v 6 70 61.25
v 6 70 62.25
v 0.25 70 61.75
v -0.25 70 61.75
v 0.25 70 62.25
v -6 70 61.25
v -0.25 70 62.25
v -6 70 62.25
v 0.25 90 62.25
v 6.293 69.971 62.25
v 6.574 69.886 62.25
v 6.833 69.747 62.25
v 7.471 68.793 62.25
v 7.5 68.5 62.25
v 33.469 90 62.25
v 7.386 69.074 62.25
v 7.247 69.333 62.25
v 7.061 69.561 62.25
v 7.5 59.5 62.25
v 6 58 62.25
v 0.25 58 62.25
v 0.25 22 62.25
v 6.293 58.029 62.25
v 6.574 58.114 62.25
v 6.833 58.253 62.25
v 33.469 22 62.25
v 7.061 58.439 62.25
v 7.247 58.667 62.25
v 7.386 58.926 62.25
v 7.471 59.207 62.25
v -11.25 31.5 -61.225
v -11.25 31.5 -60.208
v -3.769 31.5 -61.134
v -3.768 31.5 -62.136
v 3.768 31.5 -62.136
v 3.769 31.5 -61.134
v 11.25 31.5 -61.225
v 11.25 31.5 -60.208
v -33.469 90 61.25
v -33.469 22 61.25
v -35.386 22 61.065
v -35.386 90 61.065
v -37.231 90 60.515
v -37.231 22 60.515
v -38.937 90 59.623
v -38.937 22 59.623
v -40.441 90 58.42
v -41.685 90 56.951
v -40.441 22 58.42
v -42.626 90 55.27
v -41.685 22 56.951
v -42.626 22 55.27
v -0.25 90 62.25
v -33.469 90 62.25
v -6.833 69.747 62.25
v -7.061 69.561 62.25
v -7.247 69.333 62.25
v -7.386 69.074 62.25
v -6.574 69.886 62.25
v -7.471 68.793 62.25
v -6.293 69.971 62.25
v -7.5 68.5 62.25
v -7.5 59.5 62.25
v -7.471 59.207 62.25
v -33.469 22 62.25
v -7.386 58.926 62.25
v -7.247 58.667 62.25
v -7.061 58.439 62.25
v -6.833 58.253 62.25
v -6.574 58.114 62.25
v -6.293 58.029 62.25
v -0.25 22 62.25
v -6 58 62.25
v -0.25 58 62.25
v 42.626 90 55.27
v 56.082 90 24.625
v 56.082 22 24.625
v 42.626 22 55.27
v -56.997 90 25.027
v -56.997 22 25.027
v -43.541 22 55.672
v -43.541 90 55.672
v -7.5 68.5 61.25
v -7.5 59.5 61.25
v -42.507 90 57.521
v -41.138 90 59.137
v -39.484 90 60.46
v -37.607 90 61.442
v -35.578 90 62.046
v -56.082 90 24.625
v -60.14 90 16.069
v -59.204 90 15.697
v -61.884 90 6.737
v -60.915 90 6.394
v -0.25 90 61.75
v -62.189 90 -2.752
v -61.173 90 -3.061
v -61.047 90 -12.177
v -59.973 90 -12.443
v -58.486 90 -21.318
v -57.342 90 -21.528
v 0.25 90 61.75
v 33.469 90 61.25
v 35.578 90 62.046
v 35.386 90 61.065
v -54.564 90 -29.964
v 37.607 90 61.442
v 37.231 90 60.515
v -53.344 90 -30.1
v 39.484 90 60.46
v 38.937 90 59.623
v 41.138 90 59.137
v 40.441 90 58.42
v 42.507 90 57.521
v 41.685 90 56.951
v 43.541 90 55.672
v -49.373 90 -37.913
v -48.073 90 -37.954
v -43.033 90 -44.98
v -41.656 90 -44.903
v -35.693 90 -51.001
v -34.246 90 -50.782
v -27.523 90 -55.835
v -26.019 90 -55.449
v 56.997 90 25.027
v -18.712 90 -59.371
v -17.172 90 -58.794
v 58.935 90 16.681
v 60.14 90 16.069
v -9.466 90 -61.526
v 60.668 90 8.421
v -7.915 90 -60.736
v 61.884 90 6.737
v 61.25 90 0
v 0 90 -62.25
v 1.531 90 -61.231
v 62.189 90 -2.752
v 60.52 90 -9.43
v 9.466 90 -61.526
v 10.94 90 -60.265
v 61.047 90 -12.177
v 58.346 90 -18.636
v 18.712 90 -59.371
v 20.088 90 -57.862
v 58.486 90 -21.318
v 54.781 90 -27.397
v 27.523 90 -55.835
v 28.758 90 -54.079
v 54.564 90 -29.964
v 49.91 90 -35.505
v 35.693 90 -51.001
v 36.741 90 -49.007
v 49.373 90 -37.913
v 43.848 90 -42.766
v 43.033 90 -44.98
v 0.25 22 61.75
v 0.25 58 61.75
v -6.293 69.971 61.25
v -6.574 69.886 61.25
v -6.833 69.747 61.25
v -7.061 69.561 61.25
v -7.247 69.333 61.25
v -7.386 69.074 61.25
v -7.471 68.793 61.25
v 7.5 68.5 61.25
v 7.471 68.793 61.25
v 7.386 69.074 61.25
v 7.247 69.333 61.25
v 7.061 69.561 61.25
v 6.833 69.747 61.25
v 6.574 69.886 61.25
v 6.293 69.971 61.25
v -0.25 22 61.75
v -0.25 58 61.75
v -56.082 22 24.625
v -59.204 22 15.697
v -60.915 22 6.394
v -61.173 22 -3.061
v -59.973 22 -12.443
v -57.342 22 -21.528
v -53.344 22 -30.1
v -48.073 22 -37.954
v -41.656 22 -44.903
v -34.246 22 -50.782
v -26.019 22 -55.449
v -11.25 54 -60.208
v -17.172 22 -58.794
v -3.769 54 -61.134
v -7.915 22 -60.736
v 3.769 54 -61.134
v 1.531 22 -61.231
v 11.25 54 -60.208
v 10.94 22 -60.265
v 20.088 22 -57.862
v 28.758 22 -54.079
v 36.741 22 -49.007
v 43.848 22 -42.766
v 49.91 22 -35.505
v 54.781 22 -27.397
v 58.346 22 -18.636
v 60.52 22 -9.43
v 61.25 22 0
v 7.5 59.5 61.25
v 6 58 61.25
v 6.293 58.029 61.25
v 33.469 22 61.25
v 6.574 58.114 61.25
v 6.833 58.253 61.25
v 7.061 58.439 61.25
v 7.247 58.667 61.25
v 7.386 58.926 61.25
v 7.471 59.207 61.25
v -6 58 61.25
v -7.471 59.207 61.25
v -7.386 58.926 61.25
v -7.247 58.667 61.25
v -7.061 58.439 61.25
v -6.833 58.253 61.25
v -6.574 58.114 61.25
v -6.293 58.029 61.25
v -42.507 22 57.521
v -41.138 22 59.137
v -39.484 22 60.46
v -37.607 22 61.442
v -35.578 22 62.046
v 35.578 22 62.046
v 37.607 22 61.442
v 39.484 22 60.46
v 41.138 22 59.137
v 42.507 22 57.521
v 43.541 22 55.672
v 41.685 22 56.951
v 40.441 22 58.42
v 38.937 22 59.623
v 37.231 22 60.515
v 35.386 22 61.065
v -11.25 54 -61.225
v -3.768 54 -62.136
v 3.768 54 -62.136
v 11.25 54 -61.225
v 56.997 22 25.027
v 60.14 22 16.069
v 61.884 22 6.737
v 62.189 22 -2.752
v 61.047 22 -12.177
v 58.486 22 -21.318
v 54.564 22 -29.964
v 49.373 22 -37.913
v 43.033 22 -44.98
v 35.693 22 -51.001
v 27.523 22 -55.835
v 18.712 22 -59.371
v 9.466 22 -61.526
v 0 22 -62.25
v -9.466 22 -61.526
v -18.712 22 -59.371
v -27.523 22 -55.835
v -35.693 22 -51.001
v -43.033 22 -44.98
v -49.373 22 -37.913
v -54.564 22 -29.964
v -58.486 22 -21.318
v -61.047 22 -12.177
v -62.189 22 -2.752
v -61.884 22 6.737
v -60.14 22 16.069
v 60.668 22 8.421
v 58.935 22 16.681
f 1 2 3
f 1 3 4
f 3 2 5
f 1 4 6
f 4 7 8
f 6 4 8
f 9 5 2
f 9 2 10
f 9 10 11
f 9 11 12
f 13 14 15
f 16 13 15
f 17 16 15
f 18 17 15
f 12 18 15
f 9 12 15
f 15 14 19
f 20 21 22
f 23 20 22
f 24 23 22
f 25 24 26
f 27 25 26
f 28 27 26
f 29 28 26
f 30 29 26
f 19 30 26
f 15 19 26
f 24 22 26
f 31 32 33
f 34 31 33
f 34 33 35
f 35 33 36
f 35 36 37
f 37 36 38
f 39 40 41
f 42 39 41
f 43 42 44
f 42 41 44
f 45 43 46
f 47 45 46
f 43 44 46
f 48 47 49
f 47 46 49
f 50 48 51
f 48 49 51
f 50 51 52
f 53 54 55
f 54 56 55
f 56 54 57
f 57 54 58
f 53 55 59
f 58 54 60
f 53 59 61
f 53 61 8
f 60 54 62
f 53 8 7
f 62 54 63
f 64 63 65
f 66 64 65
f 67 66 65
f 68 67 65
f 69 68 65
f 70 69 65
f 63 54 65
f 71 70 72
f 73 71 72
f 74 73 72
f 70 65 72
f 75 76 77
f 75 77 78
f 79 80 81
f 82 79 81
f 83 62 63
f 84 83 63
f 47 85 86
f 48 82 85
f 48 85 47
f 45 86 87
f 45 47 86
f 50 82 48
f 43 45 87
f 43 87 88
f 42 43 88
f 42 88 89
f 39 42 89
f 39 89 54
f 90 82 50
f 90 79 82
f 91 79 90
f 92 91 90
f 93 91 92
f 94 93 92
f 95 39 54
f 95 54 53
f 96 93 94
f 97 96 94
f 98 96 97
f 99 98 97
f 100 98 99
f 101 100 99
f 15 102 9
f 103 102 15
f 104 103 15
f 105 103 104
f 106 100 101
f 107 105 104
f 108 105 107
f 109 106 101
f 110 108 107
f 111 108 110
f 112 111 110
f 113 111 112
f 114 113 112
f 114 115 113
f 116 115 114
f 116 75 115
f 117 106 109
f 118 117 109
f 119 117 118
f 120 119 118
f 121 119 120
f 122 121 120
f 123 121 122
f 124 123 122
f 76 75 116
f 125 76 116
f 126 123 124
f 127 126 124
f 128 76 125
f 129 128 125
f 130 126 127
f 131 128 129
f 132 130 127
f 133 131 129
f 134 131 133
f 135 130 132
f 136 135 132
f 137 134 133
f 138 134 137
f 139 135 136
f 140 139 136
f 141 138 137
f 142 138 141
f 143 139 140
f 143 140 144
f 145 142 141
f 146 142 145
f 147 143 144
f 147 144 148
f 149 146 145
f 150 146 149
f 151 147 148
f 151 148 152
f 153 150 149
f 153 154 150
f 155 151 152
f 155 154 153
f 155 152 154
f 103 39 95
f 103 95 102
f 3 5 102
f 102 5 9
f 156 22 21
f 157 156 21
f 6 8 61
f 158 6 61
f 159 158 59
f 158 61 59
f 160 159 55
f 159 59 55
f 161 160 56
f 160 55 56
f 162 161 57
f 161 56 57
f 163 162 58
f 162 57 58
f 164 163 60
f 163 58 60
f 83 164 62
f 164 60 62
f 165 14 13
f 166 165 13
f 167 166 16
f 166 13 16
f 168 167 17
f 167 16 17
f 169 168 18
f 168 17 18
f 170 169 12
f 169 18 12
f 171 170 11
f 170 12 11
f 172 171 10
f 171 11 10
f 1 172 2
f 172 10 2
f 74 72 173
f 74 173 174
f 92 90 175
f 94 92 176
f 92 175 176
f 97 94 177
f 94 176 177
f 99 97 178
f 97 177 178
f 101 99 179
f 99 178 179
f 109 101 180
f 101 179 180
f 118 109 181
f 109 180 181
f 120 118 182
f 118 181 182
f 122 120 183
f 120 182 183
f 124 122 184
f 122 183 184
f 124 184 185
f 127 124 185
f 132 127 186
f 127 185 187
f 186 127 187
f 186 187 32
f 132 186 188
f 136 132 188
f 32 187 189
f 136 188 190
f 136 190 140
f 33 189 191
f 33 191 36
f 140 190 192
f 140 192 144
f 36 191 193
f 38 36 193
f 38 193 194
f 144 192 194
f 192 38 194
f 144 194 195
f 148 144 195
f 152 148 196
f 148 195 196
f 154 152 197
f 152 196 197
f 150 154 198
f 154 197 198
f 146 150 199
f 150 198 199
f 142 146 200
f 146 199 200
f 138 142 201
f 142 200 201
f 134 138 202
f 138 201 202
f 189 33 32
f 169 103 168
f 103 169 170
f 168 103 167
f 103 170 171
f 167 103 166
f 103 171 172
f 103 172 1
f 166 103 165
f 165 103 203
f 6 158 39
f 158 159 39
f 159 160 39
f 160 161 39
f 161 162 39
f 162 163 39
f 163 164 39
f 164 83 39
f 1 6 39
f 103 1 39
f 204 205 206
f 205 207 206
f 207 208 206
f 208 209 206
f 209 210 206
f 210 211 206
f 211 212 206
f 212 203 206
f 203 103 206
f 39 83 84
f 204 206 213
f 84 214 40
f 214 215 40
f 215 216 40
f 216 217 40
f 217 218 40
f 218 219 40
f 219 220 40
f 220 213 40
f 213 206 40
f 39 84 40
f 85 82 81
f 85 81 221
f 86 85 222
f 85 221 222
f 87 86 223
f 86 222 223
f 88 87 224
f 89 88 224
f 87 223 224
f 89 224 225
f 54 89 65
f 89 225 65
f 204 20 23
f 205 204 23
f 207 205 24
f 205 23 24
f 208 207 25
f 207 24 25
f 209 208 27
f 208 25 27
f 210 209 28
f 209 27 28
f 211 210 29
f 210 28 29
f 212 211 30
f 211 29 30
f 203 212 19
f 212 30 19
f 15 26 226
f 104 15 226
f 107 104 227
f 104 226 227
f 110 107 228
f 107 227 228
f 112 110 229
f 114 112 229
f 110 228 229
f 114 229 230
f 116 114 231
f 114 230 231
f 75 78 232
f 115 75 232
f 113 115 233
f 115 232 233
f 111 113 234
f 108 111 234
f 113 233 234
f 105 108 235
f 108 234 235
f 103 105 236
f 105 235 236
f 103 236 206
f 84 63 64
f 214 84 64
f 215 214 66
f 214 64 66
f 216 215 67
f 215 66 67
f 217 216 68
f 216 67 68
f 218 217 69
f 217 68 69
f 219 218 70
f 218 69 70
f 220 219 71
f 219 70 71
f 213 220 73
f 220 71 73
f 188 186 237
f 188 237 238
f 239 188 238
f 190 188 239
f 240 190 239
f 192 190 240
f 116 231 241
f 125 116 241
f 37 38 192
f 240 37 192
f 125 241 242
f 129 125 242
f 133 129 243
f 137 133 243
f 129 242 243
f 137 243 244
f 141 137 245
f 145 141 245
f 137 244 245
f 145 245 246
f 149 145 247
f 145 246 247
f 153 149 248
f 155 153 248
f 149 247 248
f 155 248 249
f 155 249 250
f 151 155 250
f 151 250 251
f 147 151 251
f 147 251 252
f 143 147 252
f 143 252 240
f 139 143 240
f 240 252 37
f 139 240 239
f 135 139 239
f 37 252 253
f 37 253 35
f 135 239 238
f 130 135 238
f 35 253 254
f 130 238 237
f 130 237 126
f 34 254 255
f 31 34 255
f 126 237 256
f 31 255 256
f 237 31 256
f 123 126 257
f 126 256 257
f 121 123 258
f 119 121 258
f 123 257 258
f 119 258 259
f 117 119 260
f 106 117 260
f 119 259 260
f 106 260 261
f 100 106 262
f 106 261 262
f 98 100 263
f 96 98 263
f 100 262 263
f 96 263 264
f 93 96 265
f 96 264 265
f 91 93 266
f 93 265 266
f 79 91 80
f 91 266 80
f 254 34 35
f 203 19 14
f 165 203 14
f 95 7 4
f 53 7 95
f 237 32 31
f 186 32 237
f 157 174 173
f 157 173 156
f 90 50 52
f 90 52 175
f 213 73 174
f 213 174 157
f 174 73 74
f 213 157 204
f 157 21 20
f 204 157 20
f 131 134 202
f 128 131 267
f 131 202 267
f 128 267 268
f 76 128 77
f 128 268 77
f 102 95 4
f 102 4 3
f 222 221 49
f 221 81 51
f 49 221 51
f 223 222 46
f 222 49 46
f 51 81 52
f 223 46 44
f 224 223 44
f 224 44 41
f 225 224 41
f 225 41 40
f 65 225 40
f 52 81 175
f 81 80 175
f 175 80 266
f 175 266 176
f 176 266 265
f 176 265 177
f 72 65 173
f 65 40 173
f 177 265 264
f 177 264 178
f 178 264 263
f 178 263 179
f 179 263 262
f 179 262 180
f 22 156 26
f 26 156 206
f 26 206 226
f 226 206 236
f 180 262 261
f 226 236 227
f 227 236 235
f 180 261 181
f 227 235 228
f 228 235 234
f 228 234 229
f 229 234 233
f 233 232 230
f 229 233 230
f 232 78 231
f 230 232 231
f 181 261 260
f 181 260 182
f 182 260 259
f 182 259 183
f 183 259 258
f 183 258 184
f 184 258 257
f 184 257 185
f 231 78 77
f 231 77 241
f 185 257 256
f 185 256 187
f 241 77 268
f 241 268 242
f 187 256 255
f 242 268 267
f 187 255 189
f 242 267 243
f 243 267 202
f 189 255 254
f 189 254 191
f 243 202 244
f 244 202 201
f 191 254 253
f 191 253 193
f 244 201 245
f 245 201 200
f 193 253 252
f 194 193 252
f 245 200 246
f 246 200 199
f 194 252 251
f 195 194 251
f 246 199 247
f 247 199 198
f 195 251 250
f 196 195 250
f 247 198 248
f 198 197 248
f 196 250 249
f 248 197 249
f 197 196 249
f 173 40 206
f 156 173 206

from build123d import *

# Parameters (mm, degrees)
BOSS_EXTRUDE1_DEPTH = 90
CUT_EXTRUDE1_DEPTH  = 22
SKETCH4_W           = 22.5
SKETCH4_H           = 22.5
CUT_EXTRUDE3_DEPTH  = 126.897279558
CUT_EXTRUDE4_DEPTH  = 3
SKETCH6_W           = 0.5
SKETCH6_H           = 68
CUT_EXTRUDE5_DEPTH  = 0.5


# Read off the part's stored shape, not the designer's step: Cut-Extrude1
with BuildPart() as part:
    # Sketch1 → Boss-Extrude1 (new body)
    with BuildSketch(Plane(origin=(0, 0, 0), x_dir=(1, 0, 0), z_dir=(0, 1, 0))):
        with BuildLine():
            ThreePointArc((33.469387755, -62.25), (39.484065665, -60.45997555), (43.541212573, -55.672481752))
            Line((43.541212573, -55.672481752), (56.997372263, -25.027226277))
            ThreePointArc((56.997372263, -25.027226277), (0, 62.25), (-56.997372263, -25.027226277))
            Line((-56.997372263, -25.027226277), (-43.541212573, -55.672481752))
            ThreePointArc((-43.541212573, -55.672481752), (-39.484065665, -60.45997555), (-33.469387755, -62.25))
            Line((-33.469387755, -62.25), (33.469387755, -62.25))
        make_face()
        with BuildLine():
            Line((-9.5e-08, -61.25), (-33.469387755, -61.25))
            ThreePointArc((-33.469387755, -61.25), (-38.937276764, -59.622705046), (-42.625592135, -55.270437956))
            Line((-42.625592135, -55.270437956), (-56.081751825, -24.625182482))
            ThreePointArc((-56.081751825, -24.625182482), (-12.580842594, 59.944014711), (61.25, 0))
            ThreePointArc((61.25, 0), (59.944014711, -12.580842594), (56.081751825, -24.625182482))
            Line((56.081751825, -24.625182482), (42.625592135, -55.270437956))
            ThreePointArc((42.625592135, -55.270437956), (38.937276764, -59.622705046), (33.469387755, -61.25))
            Line((33.469387755, -61.25), (-9.5e-08, -61.25))
        make_face(mode=Mode.SUBTRACT)
    extrude(amount=BOSS_EXTRUDE1_DEPTH)

    # Cut-Extrude1 outline → Cut-Extrude1 (cut)
    with BuildSketch(Plane(origin=(0, 0, 0), x_dir=(1, 0, 0), z_dir=(0, 1, 0))):
        with BuildLine():
            Line((43.541212573, -55.672481752), (56.997372263, -25.027226277))
            ThreePointArc((56.997372263, -25.027226277), (0, 62.25), (-56.997372263, -25.027226277))
            Line((-56.997372263, -25.027226277), (-43.541212573, -55.672481752))
            ThreePointArc((-43.541212573, -55.672481752), (-39.484065665, -60.45997555), (-33.469387755, -62.25))
            Line((-33.469387755, -62.25), (33.469387755, -62.25))
            ThreePointArc((33.469387755, -62.25), (39.484065665, -60.45997555), (43.541212573, -55.672481752))
        make_face()
        with BuildLine():
            Line((33.469387755, -61.25), (-33.469387755, -61.25))
            ThreePointArc((-33.469387755, -61.25), (-38.937276765, -59.622705046), (-42.625592135, -55.270437956))
            Line((-42.625592135, -55.270437956), (-56.081751825, -24.625182482))
            ThreePointArc((-56.081751825, -24.625182482), (0, 61.25), (56.081751825, -24.625182482))
            Line((56.081751825, -24.625182482), (42.625592135, -55.270437956))
            ThreePointArc((42.625592135, -55.270437956), (38.937276765, -59.622705046), (33.469387755, -61.25))
        make_face(mode=Mode.SUBTRACT)
    extrude(amount=CUT_EXTRUDE1_DEPTH, mode=Mode.SUBTRACT)

    # Sketch4 → Cut-Extrude3 (cut, through all)
    with BuildSketch(Plane.XY):
        with Locations((0, 42.75)):
            Rectangle(SKETCH4_W, SKETCH4_H)
    extrude(amount=-CUT_EXTRUDE3_DEPTH, mode=Mode.SUBTRACT)

    # Sketch5 → Cut-Extrude4 (cut)
    with BuildSketch(Plane.XY.offset(62.25)):
        with BuildLine():
            Line((-6, 58), (6, 58))
            ThreePointArc((6, 58), (7.060660172, 58.439339828), (7.5, 59.5))
            Line((7.5, 59.5), (7.5, 68.5))
            ThreePointArc((7.5, 68.5), (7.060660172, 69.560660172), (6, 70))
            Line((6, 70), (-6, 70))
            ThreePointArc((-6, 70), (-7.060660172, 69.560660172), (-7.5, 68.5))
            Line((-7.5, 68.5), (-7.5, 59.5))
            ThreePointArc((-7.5, 59.5), (-7.060660172, 58.439339828), (-6, 58))
        make_face()
    extrude(amount=-CUT_EXTRUDE4_DEPTH, mode=Mode.SUBTRACT)

    # Sketch6 → Cut-Extrude5 (cut)
    with BuildSketch(Plane.XY.offset(62.25)):
        with Locations((0, 56)):
            Rectangle(SKETCH6_W, SKETCH6_H)
    extrude(amount=-CUT_EXTRUDE5_DEPTH, mode=Mode.SUBTRACT)


solid = part.part
